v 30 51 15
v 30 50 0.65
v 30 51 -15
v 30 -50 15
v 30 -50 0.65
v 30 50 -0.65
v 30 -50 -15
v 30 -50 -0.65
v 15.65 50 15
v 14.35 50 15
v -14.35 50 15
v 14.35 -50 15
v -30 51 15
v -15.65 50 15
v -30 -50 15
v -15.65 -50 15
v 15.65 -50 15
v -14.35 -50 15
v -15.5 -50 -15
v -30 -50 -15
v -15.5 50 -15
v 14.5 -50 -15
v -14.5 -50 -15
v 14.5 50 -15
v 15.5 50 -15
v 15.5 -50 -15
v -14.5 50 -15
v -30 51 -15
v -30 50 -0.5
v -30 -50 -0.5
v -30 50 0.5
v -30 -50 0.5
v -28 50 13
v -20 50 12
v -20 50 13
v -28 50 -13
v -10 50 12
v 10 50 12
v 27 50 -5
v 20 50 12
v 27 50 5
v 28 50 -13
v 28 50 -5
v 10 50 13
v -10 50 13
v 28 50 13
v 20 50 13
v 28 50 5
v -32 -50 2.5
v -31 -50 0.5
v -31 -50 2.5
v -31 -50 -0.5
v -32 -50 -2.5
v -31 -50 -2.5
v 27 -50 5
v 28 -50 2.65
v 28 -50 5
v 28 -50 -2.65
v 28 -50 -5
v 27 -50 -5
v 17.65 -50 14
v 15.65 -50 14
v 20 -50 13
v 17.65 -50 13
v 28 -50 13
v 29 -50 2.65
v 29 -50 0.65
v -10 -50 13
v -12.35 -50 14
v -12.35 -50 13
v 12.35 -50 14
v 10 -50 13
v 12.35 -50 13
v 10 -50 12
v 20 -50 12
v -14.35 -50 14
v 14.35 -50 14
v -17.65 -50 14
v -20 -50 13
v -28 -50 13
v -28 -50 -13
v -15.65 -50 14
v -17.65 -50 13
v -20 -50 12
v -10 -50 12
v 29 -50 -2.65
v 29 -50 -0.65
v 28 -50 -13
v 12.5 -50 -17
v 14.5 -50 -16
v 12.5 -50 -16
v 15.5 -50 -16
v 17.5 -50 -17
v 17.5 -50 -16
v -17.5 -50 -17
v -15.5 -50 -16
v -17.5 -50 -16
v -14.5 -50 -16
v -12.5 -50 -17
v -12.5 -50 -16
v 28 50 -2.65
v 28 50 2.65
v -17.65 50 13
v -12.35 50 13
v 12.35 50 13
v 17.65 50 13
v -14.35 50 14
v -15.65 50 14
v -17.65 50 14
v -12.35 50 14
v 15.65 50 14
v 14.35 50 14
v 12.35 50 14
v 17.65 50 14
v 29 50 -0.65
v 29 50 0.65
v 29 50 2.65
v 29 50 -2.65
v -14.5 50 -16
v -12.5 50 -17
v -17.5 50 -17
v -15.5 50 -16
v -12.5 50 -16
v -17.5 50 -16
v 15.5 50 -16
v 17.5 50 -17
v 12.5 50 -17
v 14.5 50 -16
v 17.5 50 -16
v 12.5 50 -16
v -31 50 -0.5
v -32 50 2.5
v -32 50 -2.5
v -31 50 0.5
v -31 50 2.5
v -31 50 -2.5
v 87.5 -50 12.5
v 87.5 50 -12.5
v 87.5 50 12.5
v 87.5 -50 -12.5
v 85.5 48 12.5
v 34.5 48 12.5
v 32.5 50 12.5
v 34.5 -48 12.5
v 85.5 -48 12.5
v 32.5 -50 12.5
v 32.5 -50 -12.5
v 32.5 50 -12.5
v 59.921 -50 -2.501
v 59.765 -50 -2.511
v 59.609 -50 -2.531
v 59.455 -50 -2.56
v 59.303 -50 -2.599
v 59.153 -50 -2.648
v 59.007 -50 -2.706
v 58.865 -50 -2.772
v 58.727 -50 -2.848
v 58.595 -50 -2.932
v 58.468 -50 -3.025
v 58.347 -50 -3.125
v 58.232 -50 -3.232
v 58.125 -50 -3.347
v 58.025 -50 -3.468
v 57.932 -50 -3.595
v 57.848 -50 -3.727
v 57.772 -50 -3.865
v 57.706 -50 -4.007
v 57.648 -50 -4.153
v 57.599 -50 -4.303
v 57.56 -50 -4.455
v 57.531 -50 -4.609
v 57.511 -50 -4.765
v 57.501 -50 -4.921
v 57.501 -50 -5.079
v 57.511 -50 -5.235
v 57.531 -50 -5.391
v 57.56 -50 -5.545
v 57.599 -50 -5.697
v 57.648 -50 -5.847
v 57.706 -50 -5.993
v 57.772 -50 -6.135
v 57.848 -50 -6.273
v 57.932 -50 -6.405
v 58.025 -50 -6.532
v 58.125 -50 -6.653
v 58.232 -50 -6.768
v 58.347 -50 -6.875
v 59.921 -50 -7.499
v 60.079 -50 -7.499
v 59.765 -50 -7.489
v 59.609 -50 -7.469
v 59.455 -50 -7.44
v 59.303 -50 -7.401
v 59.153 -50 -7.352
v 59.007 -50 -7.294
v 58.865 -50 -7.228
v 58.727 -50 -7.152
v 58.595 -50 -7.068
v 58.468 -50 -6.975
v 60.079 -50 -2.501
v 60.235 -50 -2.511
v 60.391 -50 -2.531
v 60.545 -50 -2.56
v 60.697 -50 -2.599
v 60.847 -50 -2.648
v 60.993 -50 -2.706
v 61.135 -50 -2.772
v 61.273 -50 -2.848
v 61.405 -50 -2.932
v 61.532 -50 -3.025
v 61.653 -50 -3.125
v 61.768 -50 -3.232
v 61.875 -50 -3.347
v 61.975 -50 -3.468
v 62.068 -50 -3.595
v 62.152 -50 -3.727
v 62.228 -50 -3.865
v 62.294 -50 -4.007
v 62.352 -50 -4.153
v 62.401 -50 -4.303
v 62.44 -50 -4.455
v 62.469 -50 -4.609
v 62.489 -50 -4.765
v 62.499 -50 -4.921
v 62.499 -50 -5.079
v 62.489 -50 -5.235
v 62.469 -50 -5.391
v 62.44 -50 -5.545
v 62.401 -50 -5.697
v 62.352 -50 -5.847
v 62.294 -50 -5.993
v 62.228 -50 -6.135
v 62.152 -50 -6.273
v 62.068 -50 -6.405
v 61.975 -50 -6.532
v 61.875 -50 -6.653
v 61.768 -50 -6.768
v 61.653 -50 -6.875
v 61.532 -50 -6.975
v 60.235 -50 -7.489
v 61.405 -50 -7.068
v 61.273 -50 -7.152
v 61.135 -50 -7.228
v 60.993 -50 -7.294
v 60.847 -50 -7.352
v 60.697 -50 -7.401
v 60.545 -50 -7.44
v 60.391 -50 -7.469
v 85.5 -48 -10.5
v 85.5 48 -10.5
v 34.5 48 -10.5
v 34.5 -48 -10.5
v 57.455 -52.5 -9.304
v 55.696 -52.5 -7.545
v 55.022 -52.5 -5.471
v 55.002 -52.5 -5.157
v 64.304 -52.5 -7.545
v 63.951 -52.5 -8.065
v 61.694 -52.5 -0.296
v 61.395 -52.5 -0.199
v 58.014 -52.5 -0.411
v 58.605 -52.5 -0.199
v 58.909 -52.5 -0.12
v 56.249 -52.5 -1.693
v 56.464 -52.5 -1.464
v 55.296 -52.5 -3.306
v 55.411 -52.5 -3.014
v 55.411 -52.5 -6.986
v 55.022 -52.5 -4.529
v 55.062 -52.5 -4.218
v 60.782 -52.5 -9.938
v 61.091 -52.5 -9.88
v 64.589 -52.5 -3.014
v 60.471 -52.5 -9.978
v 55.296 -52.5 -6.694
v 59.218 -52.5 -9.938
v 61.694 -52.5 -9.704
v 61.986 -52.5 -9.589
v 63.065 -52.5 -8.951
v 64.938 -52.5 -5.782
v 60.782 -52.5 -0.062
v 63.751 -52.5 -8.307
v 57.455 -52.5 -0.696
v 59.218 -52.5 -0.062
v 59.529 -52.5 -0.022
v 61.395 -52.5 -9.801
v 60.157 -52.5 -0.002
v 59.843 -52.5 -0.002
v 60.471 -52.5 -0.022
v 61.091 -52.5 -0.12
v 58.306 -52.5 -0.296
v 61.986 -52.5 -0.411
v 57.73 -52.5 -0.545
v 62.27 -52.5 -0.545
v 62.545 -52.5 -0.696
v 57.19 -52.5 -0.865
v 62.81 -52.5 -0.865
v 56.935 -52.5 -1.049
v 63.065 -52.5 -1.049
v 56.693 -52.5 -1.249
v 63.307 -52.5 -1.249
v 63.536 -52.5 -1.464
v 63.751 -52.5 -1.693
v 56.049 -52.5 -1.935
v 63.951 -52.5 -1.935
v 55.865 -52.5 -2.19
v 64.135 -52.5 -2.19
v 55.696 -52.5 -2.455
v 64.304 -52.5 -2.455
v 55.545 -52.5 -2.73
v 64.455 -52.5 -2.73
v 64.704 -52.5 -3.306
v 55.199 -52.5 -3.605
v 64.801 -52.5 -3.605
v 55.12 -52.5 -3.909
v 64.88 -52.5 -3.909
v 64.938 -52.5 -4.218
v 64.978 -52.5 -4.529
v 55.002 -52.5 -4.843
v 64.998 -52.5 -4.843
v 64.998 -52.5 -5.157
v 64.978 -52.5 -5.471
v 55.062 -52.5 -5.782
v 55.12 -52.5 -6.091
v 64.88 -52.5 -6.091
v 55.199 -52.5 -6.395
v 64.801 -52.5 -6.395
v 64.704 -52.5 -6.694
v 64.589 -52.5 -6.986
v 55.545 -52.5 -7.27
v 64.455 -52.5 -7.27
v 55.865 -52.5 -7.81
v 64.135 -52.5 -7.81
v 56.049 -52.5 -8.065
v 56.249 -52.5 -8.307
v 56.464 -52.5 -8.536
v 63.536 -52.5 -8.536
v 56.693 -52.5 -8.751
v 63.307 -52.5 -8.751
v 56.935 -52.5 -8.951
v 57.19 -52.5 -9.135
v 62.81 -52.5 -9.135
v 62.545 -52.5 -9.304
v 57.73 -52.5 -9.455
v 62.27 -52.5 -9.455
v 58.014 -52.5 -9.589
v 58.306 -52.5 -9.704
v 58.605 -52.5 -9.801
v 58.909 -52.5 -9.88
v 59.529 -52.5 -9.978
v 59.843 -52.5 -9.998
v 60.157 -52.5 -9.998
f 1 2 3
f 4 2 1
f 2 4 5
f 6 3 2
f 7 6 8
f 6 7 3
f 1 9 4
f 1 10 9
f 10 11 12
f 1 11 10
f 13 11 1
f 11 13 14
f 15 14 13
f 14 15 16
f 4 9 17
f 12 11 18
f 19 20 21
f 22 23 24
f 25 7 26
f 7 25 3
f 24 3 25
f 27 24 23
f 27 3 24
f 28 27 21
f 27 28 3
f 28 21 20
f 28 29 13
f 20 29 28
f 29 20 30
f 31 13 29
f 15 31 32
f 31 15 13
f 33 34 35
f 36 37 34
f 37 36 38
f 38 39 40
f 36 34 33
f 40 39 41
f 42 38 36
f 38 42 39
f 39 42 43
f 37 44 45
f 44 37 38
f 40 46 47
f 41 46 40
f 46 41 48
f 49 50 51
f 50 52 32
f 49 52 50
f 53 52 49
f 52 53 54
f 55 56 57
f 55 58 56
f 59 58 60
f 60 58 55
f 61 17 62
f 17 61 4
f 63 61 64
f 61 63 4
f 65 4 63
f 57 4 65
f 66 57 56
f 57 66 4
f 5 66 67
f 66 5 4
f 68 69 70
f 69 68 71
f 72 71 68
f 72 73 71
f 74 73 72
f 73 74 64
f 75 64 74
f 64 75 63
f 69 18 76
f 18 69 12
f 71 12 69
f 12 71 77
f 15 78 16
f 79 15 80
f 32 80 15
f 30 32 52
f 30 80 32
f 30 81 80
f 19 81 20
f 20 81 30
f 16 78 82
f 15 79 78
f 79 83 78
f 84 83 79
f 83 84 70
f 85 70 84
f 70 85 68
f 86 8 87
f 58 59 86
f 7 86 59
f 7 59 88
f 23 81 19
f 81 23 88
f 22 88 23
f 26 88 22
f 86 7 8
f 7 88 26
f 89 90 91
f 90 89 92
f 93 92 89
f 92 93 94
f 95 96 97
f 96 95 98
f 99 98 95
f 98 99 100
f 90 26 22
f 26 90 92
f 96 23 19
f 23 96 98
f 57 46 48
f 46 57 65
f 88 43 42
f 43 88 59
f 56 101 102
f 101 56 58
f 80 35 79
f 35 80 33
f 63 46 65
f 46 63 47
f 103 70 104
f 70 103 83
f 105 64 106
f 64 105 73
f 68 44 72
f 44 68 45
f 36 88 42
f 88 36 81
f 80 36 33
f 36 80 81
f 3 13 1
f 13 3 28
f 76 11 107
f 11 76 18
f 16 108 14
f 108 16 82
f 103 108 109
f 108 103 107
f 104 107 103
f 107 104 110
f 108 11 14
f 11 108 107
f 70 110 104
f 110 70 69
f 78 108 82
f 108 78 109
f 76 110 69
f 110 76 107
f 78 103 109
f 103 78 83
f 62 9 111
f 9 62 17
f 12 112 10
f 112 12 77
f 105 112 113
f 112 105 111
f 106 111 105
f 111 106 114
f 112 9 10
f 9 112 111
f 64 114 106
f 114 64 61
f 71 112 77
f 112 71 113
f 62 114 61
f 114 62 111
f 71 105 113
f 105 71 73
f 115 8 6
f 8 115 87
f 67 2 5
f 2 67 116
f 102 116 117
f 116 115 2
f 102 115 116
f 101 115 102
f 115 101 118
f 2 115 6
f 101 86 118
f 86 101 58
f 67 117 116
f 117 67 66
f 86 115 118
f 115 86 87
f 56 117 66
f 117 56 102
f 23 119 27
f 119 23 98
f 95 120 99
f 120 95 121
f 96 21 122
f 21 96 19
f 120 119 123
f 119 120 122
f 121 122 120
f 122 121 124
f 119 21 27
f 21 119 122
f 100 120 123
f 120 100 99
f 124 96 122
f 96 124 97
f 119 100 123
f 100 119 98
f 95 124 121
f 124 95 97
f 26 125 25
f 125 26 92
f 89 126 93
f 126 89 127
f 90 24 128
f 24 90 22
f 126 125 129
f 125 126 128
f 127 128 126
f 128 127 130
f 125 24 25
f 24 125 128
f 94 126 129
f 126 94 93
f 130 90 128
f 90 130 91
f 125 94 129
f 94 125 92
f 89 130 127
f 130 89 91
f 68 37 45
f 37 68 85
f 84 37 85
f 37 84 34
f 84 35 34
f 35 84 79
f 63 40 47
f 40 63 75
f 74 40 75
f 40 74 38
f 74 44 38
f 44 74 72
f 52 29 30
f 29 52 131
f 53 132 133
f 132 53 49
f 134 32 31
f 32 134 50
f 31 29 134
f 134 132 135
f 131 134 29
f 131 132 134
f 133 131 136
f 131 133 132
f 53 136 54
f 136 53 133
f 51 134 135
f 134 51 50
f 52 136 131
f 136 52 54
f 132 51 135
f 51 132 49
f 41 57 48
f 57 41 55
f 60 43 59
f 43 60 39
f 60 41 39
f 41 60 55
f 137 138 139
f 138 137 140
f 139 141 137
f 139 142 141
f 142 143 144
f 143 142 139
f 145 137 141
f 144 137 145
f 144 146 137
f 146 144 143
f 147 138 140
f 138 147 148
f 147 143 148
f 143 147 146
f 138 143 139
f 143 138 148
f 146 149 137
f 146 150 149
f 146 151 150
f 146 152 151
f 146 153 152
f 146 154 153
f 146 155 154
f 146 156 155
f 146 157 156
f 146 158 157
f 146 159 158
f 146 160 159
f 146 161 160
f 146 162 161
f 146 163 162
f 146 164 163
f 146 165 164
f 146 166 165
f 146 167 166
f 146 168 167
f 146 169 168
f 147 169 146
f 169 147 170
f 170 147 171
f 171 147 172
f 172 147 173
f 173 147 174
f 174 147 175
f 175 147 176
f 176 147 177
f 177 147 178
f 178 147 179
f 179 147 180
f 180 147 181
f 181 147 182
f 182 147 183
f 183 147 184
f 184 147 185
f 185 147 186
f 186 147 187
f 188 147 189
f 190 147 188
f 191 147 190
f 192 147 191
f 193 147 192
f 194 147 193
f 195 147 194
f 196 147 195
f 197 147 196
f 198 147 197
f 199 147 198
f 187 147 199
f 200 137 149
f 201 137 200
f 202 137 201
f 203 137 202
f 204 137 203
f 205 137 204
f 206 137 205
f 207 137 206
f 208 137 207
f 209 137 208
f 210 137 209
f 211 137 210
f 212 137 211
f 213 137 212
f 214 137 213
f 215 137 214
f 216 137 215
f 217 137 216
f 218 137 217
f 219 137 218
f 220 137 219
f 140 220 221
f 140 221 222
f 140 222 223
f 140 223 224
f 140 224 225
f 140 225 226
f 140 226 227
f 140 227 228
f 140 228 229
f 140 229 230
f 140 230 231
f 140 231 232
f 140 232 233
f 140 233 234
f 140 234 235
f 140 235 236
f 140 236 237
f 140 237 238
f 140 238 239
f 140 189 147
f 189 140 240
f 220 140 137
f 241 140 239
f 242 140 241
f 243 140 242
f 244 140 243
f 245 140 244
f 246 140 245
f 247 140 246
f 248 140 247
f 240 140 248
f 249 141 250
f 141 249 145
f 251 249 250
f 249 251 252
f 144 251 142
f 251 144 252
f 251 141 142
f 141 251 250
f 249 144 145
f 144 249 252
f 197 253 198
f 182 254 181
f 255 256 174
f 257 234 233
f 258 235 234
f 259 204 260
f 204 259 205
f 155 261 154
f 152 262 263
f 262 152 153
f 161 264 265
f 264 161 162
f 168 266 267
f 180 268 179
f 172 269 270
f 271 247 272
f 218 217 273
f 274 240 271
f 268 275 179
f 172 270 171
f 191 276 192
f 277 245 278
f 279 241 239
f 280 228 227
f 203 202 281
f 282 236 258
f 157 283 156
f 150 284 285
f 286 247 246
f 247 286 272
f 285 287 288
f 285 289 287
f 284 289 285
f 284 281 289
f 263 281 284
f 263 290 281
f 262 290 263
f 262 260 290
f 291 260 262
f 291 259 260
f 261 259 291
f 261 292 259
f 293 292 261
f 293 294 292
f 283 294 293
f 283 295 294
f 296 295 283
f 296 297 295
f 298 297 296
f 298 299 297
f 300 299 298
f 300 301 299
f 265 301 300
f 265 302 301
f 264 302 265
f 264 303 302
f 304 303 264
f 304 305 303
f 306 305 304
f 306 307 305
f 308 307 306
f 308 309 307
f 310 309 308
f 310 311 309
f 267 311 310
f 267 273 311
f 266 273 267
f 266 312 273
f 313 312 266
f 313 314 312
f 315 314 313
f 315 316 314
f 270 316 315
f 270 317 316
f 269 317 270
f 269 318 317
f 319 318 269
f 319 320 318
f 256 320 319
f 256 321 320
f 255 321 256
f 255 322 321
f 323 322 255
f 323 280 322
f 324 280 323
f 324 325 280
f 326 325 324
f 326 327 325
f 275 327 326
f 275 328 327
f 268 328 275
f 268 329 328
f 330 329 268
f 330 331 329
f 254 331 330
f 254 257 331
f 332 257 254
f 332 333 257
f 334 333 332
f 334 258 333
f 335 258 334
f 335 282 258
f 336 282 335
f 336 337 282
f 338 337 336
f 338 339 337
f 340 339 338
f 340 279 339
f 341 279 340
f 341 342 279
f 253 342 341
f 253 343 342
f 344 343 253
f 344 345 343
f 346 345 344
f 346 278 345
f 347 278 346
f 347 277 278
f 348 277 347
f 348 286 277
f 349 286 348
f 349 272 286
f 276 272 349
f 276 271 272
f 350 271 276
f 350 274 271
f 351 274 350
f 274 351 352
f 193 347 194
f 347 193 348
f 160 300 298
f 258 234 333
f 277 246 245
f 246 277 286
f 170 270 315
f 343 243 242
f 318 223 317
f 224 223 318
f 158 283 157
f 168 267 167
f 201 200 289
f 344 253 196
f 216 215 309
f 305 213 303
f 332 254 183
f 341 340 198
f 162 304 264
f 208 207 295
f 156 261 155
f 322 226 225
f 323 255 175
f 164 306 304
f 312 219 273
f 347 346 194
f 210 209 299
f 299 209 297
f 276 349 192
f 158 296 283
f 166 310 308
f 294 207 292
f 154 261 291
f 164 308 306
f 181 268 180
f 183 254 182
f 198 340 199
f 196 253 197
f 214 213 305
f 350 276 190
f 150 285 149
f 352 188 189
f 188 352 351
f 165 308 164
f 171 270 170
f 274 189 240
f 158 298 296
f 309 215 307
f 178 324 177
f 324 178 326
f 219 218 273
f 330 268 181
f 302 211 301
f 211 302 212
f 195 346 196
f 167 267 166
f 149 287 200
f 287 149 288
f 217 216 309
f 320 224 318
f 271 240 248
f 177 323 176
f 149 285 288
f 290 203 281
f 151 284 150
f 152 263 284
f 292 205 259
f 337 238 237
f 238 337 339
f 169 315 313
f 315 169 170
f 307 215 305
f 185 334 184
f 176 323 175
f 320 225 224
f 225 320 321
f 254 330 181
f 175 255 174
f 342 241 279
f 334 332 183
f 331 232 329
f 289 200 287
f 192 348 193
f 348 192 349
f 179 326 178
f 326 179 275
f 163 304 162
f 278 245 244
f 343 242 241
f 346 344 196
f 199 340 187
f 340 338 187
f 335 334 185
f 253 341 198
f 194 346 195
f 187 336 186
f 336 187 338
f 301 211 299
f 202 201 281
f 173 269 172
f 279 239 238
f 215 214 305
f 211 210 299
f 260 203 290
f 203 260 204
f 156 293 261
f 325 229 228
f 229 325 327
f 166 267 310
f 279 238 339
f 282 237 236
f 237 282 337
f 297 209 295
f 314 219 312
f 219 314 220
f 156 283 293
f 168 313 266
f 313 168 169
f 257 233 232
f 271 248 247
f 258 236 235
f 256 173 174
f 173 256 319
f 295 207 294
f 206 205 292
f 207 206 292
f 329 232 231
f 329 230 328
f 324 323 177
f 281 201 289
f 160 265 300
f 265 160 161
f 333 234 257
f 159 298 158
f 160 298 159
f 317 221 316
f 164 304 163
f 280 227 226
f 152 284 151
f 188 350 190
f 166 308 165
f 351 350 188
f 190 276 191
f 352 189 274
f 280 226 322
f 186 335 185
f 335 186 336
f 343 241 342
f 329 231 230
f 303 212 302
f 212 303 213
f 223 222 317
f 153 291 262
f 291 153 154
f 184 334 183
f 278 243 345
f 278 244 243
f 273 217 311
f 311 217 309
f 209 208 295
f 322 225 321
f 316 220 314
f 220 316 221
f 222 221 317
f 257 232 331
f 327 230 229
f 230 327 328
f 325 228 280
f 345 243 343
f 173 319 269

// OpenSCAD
 
/////////
//setup//
/////////

// use this to change the space between the holders for x axis
xSpace = 30;

// the number of holders in the x dimention
xHolders = 2;

// use this to change the space between the holders for z axis
zSpace = 30;

// the number of holders in the z dimention
zHolders = 1;

// the tolerance for holding mounts
holderTolerance = .3;

// the lenth of drawers
lenth = 100;

// for tolerance of printer for wall
wallTolerance = 1;

// the thickness of case wall
caseWallThickness = 2;

// if you want the holders to be auto generated
autoGeneratedHolder = 1;

// with of holder
hWith = 5;

//with of side holders
sHWith = 5;

// the thickness of the backplate
bPThickness = 1;

// the thickness for the Top Holder Plate
TopHolderPlateThickness = 1;

// the overlap of Top Holder Plate
TopHolderPlateOverlap = 5;

// the thickness for the right Holder Plate
rightHolderPlateThickness = 1;

// the overlap of right Holder Plate
rightHolderPlateOverlap = 5;

// the thickness of the drawer walls
dWThickness = 2;

// the thickiness of the drawerbottom
dBThickness = 2;

// the diamiter of the knob
kDiamiter = 10;

// the lenth of the knob
kLenth = 2.5;

// the knob type
knobT = 4;

//the offset of the knob(-offset = down and +offset = up )
knobO = -5;

knobR = 2;

knobPlateThickness = 1;

/////////////
//maincode://
/////////////

xlenthDeterminer = xSpace*xHolders;
zlenthDeterminer = zSpace*zHolders;

/////////
//shell//
/////////

module shell(){

    cube1 = [ 
    
        xlenthDeterminer,
        lenth,
        zlenthDeterminer
    
    ];

    cube2 = [
    
        xlenthDeterminer - caseWallThickness * 2 ,
        lenth,
        zlenthDeterminer - caseWallThickness * 2
    
    ];

    difference(){

        cube(cube1 , center = true);
        cube(cube2 , center = true);
        
    }
    
    translate([ 0 , (lenth / 2) + (bPThickness / 2)  , 0]){
    
        cube([xlenthDeterminer , bPThickness , zlenthDeterminer] , center = true);

    }
}


//////////
//holder//
////////// 

    hThickness = caseWallThickness / 2 ;

module holder(holderTolerance1 , with){
    
    holderPart1 = [
    
        hThickness + holderTolerance1,
        lenth,
        caseWallThickness
    
    ];
    
    holderPart2 = [
    
        with + holderTolerance1 ,
        lenth,
        hThickness
    
    ];
    
    
       
        cube(holderPart1, center = true);    

        translate([ 0 , 0 , -1 * (hThickness / 2) ]){
                
            cube(holderPart2, center = true);
             
        }
    }
    
    module rotatedHolder(holderTolerance2 , with2){
        
        rotate(a = [0,90,0]){
            
            holder(holderTolerance2 , with2);
            
            }
        
        }
    
    module holderTop1PT( x ){
    
        topHolderOffset = (zlenthDeterminer / 2) - (caseWallThickness / 2);
        
        translate([ x , 0 , topHolderOffset ]){
            
            holder(holderTolerance , hWith);
            
        }   
    }
    
    module holderBottom1PT( x ){
    
        bottomHolderOffset = -(((zlenthDeterminer / 2) + caseWallThickness) - (caseWallThickness / 2));
        
        translate([ x , 0 , bottomHolderOffset ]){
            
            holder( 0 , hWith);
            
        }   
    }
    
    module holderRight1PT(z){
        
        rightHolderOffset =  (xlenthDeterminer / 2) - (caseWallThickness / 2);
        
        translate([ rightHolderOffset , 0 , z ]){
            
            rotatedHolder( holderTolerance , sHWith);
            
        }   
    }
        
    module holderLeft1PT(z){
        
        leftHolderOffset =  -((xlenthDeterminer / 2) + (caseWallThickness/2));
        
        translate([ leftHolderOffset , 0 , z ]){
            
            rotatedHolder( 0 , sHWith);
            
        }
    }   
    
    module topHolderPlate(x){
        
        topHolderOffset = (zlenthDeterminer / 2) - (caseWallThickness +  TopHolderPlateThickness / 2);
        
        topPlateDimentions = [
        
        hWith + TopHolderPlateOverlap, 
        lenth, 
        TopHolderPlateThickness
        
        ];
        
        translate([ x , 0 , topHolderOffset ]){
            
            cube(topPlateDimentions, center = true);
            
        }   
    }
        
     module rightHolderPlate(z){
        
        rightHolderOffset = (xlenthDeterminer / 2) - (caseWallThickness +  rightHolderPlateThickness / 2);
         
        rightPlateDimentions = [
            
            rightHolderPlateThickness,
            lenth,
            sHWith + rightHolderPlateOverlap
            
            ];
         
        translate([ rightHolderOffset , 0 , z ]){
            
            
            
            cube(rightPlateDimentions, center = true);
            
        }   
    }
        
    module topHolderPlateMain(){
        
        for(i = [0 : 1 : xHolders - 1 ]){
            
            xHolderOffset = -(xlenthDeterminer / 2) + (i * xSpace) + (xSpace / 2); 
            topHolderPlate(xHolderOffset);
            
        }
        
    }
        
    module rightHolderPlateMain(){
        
        for(i = [0 : 1 : zHolders - 1 ]){
            
            zHolderOffset = -(zlenthDeterminer / 2) + (i * zSpace) + (zSpace / 2); 
            rightHolderPlate(zHolderOffset);
            
        }
        
    }

    module holderTopMain(){

        for(i = [0 : 1 : xHolders - 1 ]){
            
            xHolderOffset = -(xlenthDeterminer / 2) + (i * xSpace) + (xSpace / 2); 
            holderTop1PT(xHolderOffset);

            
        }
    }
    
    module holderBottomMain(){

        for(i = [0 : 1 : xHolders - 1 ]){
            
            xHolderOffset = -(xlenthDeterminer / 2) + (i * xSpace) + (xSpace / 2); 
            holderBottom1PT(xHolderOffset);
            
        }
    }
    
    module holderRightMain(){
        
        for(i = [0 : 1 : zHolders - 1 ]){
            
            zHolderOffset = -(zlenthDeterminer / 2) + (i * zSpace) + (zSpace / 2); 
            holderRight1PT(zHolderOffset);
        
        }
    }
    
    module holderLeftMain(){
        
        for(i = [0 : 1 : zHolders - 1 ]){
            
            zHolderOffset = -(zlenthDeterminer / 2) + (i * zSpace) + (zSpace / 2); 
            holderLeft1PT(zHolderOffset);
        
        }
    }
   
    module holderTopAndRight(){
        
            holderTopMain();
            holderRightMain();
        
        }
    
    module mainCase(){
    
        difference(){
            
            shell();
            holderTopAndRight();
                
            }
        
            

        holderBottomMain(); 
        topHolderPlateMain();
        holderLeftMain();
        rightHolderPlateMain();
    
    }
    
    mainCase();
    
   //////////
   //drawer//
   //////////
   
    module drawerShell(){
        
        drawerCube1 = [
        
        (xlenthDeterminer - (caseWallThickness*2)) - wallTolerance,
        lenth,
        (zlenthDeterminer - (caseWallThickness*2)) - wallTolerance
        
        ];
        
        drawerCube2 = [
        
        (xlenthDeterminer - (caseWallThickness*2)) - (wallTolerance + (dWThickness * 2)),
        lenth - (dWThickness * 2),
        (zlenthDeterminer - (caseWallThickness*2)) - wallTolerance
        
        ];
        
        difference(){
        
            cube(drawerCube1, center = true);
            translate([0, 0, dBThickness]) cube(drawerCube2, center = true);
        }
    }
    
    
    
    module knob(){
        
        kRadius = kDiamiter / 2;
        
        translate([0, -((lenth/2) + (kLenth/2)), knobO]){
        
            rotate(a = [90, 45, 180]){
                
                if(knobT == 1){
                    
                    cylinder(h = kLenth, r1 = kRadius, r2 = kRadius/knobR, $fn = 4 , center = true);
                    
                }
                    
                else{
                    
                    if(knobT == 2){
                    
                    cylinder(h = kLenth, r1 = kRadius, r2 = kRadius/knobR, $fn = 6 , center = true);
                    
                    }
                    
                    else{
                    
                        if(knobT == 3){
                    
                            cylinder(h = kLenth, r1 = kRadius, r2 = kRadius/knobR, $fn = 8 , center = true);
                    
                        }
                        
                        else{
                    
                            if(knobT == 4){
                    
                                cylinder(h = kLenth, r1 = kRadius, r2 = kRadius/knobR, $fn = 100 , center = true);
                    
                            }
                        }
                    }
                }
            }
            
            if(knobT > 4){
                
                cube([kDiamiter/knobR, kLenth, kDiamiter/knobR] , center = true);
                translate([0, (kLenth/2) - (knobPlateThickness / 2) , 0]) cube([kDiamiter, knobPlateThickness, kDiamiter] , center = true);
                
            }
        }
    }
    
    module drawerShellMain(){
    
    drawerShell();
    knob();
        
    }
    
    translate([xlenthDeterminer, 0, 0])drawerShellMain();
